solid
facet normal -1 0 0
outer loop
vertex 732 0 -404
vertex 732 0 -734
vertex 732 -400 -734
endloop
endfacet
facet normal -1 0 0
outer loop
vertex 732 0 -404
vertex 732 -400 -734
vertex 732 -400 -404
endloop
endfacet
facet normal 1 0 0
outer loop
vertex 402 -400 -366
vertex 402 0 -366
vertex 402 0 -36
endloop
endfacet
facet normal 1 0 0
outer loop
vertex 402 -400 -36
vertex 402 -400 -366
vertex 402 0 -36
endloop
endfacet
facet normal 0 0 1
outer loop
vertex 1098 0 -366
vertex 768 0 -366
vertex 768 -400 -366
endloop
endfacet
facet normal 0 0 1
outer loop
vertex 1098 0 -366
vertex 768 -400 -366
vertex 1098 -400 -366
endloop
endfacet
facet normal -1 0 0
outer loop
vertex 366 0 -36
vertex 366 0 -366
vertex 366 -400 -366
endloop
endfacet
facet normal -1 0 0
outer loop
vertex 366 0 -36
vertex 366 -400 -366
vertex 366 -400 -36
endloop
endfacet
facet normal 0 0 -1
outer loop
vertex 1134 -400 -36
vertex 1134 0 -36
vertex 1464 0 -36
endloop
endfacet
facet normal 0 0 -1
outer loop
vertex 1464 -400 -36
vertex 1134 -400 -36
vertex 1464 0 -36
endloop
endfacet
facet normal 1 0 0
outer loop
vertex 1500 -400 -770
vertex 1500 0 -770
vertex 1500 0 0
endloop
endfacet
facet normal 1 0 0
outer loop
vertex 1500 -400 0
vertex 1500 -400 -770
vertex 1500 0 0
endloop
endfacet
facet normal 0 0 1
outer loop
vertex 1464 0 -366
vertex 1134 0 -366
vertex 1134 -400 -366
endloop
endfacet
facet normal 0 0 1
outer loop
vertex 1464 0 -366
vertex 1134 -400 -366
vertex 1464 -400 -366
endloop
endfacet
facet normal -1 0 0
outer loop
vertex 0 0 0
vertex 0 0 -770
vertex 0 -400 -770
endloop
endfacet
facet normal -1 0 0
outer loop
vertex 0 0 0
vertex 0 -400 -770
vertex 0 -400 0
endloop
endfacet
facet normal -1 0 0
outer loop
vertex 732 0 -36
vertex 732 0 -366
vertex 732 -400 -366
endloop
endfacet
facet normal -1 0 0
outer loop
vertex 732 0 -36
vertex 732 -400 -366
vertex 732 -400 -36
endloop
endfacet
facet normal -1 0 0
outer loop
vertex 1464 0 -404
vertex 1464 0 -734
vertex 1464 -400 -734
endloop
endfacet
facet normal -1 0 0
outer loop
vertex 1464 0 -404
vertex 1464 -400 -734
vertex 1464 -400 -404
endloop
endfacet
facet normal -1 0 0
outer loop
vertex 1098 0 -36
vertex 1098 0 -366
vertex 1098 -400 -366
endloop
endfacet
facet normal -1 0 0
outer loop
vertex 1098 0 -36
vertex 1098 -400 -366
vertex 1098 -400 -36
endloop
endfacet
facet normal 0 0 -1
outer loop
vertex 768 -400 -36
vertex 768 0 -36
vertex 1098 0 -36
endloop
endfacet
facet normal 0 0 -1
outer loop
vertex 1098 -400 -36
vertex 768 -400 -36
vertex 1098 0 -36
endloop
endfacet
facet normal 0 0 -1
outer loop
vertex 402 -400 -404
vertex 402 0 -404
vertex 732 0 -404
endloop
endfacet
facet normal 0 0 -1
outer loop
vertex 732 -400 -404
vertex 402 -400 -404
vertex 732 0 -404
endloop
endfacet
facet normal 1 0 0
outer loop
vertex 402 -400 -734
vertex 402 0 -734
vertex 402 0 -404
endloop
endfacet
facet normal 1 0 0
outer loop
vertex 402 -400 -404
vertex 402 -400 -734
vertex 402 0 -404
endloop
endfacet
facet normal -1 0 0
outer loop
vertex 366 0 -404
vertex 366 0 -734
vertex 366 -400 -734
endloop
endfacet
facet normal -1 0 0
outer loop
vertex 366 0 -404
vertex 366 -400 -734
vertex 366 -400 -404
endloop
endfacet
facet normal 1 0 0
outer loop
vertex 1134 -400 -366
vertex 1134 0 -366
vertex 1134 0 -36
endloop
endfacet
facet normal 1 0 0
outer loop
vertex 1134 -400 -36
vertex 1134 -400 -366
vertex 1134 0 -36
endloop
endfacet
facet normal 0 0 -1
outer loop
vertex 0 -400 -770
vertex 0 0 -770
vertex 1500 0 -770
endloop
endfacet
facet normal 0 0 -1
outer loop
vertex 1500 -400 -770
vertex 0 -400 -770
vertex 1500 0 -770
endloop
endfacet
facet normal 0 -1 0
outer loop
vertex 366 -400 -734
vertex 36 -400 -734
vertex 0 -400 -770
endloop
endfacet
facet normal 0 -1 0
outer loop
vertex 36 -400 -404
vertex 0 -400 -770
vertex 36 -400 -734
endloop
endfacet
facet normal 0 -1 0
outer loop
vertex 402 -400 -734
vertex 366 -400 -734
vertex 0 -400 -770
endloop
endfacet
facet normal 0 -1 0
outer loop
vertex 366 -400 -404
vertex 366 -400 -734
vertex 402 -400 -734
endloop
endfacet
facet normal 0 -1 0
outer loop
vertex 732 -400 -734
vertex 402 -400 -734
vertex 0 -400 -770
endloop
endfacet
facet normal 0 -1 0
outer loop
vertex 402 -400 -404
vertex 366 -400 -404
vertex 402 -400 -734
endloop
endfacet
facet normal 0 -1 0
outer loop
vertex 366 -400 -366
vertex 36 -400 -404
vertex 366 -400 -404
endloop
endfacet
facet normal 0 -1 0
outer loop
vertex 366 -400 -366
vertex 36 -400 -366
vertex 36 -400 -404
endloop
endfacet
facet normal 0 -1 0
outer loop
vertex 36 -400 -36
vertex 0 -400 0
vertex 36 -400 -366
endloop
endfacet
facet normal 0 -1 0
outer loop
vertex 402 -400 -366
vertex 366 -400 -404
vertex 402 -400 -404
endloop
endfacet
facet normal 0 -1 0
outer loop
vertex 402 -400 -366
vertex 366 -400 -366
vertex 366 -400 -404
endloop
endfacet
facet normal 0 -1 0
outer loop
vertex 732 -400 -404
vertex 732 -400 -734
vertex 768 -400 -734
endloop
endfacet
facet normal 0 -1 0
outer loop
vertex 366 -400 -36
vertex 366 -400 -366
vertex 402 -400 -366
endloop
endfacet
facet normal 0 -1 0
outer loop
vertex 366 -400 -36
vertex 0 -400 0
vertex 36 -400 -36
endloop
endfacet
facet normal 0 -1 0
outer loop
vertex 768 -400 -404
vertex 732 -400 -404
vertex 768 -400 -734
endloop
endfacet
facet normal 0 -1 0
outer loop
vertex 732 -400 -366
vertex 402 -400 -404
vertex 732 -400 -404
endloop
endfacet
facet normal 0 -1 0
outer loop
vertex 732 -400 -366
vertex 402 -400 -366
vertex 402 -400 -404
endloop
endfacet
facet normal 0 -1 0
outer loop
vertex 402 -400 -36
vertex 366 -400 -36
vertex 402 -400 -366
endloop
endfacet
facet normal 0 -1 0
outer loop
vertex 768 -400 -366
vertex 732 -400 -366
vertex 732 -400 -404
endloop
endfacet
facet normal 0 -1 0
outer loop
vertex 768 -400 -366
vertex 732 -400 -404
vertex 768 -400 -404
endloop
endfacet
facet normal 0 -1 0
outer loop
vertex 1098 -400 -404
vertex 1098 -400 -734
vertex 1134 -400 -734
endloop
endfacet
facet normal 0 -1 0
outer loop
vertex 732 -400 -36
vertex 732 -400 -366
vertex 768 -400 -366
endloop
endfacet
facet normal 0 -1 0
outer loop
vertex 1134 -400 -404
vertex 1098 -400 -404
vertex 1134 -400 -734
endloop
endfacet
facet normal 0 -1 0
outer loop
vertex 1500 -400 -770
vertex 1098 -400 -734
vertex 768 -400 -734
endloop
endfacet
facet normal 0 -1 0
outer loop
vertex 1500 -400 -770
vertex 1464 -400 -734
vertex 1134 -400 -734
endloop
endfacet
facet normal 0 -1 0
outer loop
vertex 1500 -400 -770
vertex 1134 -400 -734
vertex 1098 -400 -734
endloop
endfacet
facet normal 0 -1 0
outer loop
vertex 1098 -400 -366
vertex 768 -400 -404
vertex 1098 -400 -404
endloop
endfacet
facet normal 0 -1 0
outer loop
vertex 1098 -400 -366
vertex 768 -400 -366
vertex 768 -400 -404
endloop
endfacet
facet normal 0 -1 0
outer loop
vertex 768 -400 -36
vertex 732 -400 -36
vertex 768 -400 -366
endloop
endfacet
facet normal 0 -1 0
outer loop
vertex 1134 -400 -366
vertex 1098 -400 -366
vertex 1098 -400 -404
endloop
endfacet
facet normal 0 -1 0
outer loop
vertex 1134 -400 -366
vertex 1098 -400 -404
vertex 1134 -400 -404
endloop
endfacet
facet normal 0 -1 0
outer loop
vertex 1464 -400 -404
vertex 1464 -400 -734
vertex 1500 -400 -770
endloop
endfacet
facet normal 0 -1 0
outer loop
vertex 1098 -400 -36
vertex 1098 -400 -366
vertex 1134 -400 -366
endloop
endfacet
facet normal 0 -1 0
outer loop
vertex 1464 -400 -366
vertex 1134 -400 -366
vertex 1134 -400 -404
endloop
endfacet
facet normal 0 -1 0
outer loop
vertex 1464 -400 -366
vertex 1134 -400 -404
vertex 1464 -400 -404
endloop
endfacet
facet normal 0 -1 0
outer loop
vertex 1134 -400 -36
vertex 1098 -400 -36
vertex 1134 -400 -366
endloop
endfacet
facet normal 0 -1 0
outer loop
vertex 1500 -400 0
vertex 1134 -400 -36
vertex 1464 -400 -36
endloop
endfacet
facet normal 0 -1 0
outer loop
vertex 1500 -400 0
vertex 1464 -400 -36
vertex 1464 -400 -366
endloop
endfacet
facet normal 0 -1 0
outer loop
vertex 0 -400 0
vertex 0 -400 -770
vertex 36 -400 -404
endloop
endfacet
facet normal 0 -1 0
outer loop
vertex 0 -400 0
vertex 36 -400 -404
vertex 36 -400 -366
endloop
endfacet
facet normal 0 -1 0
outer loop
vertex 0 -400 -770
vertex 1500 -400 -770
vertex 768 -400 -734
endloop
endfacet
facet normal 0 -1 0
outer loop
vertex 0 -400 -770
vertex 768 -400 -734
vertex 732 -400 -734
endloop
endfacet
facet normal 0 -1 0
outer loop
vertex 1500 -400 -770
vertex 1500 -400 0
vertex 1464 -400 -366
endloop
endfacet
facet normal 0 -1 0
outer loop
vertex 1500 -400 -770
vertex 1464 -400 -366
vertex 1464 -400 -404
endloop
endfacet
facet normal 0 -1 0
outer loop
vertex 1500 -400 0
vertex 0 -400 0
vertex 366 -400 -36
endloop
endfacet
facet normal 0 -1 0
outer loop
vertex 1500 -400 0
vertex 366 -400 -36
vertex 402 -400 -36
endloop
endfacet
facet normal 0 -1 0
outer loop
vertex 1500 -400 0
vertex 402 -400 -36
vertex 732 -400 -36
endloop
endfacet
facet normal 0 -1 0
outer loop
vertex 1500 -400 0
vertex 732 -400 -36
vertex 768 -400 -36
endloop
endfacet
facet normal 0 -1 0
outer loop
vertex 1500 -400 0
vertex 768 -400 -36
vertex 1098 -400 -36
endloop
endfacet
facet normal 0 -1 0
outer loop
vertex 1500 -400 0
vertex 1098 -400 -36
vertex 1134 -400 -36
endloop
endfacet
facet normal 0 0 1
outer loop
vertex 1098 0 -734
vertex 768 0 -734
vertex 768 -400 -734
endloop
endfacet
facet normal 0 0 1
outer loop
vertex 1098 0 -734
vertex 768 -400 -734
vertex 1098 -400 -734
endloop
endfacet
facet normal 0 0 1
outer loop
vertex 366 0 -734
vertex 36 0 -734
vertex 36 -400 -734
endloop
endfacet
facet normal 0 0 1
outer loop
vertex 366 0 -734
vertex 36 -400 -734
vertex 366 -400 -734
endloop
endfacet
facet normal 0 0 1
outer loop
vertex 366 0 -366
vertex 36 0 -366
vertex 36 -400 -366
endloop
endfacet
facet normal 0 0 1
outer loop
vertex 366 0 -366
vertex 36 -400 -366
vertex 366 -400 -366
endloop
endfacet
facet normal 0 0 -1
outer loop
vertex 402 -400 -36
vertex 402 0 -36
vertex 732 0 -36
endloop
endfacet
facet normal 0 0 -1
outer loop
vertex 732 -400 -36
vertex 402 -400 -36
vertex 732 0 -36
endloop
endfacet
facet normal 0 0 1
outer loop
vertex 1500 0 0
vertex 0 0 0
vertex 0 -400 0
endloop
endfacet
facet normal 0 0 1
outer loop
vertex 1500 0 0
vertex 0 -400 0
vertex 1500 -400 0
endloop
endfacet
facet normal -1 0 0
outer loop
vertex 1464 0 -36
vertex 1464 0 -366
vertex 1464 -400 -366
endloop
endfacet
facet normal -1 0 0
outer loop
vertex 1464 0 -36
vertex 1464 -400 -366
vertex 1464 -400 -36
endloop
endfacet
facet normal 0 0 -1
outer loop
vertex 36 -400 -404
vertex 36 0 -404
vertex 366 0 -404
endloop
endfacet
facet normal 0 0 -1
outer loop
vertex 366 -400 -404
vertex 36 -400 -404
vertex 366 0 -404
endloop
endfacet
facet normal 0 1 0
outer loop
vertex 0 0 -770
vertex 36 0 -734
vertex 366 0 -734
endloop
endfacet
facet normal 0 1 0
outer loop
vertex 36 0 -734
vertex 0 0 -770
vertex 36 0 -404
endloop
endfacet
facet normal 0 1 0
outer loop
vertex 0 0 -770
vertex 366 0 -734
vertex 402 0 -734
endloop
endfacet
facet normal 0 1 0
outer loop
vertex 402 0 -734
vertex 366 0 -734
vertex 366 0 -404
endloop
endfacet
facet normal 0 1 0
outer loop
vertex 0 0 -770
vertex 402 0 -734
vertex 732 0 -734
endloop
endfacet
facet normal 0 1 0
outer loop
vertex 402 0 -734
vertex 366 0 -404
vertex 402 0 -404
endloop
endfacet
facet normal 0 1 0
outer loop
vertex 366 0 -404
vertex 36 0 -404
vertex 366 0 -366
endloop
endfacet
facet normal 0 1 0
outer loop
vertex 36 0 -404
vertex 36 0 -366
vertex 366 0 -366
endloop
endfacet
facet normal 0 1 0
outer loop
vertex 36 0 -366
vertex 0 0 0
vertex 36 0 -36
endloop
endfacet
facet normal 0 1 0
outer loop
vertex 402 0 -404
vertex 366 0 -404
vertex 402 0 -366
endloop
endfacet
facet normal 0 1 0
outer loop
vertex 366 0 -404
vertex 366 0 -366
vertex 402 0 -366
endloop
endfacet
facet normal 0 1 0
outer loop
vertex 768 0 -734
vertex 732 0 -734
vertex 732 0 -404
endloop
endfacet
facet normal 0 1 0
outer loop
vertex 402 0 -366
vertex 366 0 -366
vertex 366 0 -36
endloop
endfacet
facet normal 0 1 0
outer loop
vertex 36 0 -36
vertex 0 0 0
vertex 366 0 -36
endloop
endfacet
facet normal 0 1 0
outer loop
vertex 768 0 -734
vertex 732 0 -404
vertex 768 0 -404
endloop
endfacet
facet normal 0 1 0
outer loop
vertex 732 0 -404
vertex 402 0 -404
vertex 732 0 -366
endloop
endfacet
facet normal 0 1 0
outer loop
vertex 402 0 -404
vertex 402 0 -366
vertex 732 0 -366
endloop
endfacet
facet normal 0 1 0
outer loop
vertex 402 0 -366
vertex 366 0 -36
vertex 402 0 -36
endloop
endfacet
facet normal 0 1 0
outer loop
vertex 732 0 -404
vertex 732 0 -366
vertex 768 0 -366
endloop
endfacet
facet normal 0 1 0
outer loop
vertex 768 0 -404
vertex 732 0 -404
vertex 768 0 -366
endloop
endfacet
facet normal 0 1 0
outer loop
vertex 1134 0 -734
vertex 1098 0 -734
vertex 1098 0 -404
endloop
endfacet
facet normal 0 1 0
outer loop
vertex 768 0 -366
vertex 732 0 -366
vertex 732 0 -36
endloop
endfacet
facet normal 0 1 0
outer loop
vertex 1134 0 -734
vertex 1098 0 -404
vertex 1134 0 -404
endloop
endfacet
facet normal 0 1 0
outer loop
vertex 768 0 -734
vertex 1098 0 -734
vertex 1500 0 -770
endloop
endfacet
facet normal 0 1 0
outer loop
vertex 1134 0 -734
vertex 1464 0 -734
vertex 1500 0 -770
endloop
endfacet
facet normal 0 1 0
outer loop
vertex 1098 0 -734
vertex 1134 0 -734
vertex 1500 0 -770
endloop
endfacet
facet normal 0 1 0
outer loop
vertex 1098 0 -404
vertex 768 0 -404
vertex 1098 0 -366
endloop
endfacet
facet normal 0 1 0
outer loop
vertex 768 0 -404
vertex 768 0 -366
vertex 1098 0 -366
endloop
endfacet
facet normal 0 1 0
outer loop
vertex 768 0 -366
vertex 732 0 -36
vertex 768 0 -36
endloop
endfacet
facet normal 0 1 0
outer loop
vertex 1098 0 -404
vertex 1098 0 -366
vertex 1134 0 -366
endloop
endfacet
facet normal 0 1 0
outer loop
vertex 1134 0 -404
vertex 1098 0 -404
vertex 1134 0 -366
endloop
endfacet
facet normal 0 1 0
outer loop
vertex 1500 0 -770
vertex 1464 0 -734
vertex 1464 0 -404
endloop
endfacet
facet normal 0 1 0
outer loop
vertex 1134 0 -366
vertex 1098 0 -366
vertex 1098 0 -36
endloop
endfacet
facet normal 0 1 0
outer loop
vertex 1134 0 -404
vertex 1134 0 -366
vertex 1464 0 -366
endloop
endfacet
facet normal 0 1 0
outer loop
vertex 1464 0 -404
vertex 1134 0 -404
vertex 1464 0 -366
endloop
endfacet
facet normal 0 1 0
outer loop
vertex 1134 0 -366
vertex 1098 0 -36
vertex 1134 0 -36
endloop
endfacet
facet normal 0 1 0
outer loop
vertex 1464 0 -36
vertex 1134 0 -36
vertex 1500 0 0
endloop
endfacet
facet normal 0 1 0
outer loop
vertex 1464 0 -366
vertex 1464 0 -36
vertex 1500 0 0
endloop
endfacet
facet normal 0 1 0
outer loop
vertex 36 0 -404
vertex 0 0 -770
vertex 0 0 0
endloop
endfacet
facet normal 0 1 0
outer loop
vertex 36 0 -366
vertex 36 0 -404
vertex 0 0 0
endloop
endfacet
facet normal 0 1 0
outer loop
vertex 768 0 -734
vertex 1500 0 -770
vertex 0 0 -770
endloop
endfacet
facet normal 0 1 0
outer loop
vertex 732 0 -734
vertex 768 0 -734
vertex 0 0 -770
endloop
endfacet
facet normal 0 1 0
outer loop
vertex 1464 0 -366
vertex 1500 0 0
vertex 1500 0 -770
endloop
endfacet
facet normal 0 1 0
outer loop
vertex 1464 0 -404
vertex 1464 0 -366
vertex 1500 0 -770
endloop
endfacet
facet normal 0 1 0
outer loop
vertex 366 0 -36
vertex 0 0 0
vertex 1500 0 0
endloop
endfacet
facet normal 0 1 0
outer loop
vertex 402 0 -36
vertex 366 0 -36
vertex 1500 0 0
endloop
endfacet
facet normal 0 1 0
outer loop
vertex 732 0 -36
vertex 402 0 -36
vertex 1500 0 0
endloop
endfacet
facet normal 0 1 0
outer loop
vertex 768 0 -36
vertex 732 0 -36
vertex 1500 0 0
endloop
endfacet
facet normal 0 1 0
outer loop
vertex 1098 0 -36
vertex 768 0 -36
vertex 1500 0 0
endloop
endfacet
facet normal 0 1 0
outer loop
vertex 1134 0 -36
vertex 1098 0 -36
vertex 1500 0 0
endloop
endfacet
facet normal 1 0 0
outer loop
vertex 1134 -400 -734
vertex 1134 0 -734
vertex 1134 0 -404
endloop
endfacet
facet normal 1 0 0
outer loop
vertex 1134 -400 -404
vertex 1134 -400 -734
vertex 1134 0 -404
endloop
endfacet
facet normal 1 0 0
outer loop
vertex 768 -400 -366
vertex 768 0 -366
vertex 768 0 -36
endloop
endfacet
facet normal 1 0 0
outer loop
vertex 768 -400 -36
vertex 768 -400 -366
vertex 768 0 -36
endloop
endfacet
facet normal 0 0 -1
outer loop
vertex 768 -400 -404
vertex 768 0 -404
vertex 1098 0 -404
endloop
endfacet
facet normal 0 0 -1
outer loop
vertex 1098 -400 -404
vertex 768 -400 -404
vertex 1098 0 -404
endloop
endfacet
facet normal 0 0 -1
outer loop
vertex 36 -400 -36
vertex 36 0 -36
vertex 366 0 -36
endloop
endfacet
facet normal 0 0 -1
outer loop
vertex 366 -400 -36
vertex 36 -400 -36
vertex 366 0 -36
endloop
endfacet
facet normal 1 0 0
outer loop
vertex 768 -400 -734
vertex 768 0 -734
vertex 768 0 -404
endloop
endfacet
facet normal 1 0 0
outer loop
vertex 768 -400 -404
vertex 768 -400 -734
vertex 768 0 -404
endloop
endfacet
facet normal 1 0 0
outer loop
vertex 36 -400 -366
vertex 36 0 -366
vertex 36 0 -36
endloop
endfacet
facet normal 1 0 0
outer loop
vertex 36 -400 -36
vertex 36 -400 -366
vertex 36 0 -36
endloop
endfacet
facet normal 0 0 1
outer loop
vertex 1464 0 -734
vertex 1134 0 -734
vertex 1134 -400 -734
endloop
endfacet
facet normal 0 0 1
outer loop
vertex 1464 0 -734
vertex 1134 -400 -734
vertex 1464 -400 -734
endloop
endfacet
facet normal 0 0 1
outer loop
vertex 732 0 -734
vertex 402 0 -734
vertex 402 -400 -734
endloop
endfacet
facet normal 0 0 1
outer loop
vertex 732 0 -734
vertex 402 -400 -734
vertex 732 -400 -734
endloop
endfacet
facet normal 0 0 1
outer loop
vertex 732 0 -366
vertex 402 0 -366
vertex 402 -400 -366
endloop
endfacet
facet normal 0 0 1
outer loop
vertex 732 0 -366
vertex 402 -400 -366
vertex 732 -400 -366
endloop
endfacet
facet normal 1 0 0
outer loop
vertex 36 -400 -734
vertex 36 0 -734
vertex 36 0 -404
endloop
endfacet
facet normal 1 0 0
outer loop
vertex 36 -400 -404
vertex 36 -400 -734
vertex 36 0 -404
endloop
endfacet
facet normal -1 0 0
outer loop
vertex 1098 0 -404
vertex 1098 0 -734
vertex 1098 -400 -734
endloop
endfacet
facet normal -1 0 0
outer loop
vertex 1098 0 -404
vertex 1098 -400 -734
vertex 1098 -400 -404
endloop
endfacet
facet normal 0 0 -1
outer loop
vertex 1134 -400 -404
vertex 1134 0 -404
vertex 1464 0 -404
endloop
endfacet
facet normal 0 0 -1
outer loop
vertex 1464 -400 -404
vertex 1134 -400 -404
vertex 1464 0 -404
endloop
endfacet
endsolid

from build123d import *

# Parameters (mm, degrees)
F0_W     = 1500
F0_H     = 770
F0_W_2   = 330
F0_H_2   = 330
F1_DEPTH = 400


with BuildPart() as f1:
    # F0 (on Front) → F1 (new body)
    with BuildSketch(Plane.XZ):
        with Locations((750, -385)):
            Rectangle(F0_W, F0_H)
        with Locations((201, -569)):
            Rectangle(F0_W_2, F0_H_2, mode=Mode.SUBTRACT)
        with Locations((567, -569)):
            Rectangle(F0_W_2, F0_H_2, mode=Mode.SUBTRACT)
        with Locations((933, -569)):
            Rectangle(F0_W_2, F0_H_2, mode=Mode.SUBTRACT)
        with Locations((1299, -569)):
            Rectangle(F0_W_2, F0_H_2, mode=Mode.SUBTRACT)
        with Locations((201, -201)):
            Rectangle(F0_W_2, F0_H_2, mode=Mode.SUBTRACT)
        with Locations((567, -201)):
            Rectangle(F0_W_2, F0_H_2, mode=Mode.SUBTRACT)
        with Locations((933, -201)):
            Rectangle(F0_W_2, F0_H_2, mode=Mode.SUBTRACT)
        with Locations((1299, -201)):
            Rectangle(F0_W_2, F0_H_2, mode=Mode.SUBTRACT)
    extrude(amount=F1_DEPTH)


solid = f1.part
